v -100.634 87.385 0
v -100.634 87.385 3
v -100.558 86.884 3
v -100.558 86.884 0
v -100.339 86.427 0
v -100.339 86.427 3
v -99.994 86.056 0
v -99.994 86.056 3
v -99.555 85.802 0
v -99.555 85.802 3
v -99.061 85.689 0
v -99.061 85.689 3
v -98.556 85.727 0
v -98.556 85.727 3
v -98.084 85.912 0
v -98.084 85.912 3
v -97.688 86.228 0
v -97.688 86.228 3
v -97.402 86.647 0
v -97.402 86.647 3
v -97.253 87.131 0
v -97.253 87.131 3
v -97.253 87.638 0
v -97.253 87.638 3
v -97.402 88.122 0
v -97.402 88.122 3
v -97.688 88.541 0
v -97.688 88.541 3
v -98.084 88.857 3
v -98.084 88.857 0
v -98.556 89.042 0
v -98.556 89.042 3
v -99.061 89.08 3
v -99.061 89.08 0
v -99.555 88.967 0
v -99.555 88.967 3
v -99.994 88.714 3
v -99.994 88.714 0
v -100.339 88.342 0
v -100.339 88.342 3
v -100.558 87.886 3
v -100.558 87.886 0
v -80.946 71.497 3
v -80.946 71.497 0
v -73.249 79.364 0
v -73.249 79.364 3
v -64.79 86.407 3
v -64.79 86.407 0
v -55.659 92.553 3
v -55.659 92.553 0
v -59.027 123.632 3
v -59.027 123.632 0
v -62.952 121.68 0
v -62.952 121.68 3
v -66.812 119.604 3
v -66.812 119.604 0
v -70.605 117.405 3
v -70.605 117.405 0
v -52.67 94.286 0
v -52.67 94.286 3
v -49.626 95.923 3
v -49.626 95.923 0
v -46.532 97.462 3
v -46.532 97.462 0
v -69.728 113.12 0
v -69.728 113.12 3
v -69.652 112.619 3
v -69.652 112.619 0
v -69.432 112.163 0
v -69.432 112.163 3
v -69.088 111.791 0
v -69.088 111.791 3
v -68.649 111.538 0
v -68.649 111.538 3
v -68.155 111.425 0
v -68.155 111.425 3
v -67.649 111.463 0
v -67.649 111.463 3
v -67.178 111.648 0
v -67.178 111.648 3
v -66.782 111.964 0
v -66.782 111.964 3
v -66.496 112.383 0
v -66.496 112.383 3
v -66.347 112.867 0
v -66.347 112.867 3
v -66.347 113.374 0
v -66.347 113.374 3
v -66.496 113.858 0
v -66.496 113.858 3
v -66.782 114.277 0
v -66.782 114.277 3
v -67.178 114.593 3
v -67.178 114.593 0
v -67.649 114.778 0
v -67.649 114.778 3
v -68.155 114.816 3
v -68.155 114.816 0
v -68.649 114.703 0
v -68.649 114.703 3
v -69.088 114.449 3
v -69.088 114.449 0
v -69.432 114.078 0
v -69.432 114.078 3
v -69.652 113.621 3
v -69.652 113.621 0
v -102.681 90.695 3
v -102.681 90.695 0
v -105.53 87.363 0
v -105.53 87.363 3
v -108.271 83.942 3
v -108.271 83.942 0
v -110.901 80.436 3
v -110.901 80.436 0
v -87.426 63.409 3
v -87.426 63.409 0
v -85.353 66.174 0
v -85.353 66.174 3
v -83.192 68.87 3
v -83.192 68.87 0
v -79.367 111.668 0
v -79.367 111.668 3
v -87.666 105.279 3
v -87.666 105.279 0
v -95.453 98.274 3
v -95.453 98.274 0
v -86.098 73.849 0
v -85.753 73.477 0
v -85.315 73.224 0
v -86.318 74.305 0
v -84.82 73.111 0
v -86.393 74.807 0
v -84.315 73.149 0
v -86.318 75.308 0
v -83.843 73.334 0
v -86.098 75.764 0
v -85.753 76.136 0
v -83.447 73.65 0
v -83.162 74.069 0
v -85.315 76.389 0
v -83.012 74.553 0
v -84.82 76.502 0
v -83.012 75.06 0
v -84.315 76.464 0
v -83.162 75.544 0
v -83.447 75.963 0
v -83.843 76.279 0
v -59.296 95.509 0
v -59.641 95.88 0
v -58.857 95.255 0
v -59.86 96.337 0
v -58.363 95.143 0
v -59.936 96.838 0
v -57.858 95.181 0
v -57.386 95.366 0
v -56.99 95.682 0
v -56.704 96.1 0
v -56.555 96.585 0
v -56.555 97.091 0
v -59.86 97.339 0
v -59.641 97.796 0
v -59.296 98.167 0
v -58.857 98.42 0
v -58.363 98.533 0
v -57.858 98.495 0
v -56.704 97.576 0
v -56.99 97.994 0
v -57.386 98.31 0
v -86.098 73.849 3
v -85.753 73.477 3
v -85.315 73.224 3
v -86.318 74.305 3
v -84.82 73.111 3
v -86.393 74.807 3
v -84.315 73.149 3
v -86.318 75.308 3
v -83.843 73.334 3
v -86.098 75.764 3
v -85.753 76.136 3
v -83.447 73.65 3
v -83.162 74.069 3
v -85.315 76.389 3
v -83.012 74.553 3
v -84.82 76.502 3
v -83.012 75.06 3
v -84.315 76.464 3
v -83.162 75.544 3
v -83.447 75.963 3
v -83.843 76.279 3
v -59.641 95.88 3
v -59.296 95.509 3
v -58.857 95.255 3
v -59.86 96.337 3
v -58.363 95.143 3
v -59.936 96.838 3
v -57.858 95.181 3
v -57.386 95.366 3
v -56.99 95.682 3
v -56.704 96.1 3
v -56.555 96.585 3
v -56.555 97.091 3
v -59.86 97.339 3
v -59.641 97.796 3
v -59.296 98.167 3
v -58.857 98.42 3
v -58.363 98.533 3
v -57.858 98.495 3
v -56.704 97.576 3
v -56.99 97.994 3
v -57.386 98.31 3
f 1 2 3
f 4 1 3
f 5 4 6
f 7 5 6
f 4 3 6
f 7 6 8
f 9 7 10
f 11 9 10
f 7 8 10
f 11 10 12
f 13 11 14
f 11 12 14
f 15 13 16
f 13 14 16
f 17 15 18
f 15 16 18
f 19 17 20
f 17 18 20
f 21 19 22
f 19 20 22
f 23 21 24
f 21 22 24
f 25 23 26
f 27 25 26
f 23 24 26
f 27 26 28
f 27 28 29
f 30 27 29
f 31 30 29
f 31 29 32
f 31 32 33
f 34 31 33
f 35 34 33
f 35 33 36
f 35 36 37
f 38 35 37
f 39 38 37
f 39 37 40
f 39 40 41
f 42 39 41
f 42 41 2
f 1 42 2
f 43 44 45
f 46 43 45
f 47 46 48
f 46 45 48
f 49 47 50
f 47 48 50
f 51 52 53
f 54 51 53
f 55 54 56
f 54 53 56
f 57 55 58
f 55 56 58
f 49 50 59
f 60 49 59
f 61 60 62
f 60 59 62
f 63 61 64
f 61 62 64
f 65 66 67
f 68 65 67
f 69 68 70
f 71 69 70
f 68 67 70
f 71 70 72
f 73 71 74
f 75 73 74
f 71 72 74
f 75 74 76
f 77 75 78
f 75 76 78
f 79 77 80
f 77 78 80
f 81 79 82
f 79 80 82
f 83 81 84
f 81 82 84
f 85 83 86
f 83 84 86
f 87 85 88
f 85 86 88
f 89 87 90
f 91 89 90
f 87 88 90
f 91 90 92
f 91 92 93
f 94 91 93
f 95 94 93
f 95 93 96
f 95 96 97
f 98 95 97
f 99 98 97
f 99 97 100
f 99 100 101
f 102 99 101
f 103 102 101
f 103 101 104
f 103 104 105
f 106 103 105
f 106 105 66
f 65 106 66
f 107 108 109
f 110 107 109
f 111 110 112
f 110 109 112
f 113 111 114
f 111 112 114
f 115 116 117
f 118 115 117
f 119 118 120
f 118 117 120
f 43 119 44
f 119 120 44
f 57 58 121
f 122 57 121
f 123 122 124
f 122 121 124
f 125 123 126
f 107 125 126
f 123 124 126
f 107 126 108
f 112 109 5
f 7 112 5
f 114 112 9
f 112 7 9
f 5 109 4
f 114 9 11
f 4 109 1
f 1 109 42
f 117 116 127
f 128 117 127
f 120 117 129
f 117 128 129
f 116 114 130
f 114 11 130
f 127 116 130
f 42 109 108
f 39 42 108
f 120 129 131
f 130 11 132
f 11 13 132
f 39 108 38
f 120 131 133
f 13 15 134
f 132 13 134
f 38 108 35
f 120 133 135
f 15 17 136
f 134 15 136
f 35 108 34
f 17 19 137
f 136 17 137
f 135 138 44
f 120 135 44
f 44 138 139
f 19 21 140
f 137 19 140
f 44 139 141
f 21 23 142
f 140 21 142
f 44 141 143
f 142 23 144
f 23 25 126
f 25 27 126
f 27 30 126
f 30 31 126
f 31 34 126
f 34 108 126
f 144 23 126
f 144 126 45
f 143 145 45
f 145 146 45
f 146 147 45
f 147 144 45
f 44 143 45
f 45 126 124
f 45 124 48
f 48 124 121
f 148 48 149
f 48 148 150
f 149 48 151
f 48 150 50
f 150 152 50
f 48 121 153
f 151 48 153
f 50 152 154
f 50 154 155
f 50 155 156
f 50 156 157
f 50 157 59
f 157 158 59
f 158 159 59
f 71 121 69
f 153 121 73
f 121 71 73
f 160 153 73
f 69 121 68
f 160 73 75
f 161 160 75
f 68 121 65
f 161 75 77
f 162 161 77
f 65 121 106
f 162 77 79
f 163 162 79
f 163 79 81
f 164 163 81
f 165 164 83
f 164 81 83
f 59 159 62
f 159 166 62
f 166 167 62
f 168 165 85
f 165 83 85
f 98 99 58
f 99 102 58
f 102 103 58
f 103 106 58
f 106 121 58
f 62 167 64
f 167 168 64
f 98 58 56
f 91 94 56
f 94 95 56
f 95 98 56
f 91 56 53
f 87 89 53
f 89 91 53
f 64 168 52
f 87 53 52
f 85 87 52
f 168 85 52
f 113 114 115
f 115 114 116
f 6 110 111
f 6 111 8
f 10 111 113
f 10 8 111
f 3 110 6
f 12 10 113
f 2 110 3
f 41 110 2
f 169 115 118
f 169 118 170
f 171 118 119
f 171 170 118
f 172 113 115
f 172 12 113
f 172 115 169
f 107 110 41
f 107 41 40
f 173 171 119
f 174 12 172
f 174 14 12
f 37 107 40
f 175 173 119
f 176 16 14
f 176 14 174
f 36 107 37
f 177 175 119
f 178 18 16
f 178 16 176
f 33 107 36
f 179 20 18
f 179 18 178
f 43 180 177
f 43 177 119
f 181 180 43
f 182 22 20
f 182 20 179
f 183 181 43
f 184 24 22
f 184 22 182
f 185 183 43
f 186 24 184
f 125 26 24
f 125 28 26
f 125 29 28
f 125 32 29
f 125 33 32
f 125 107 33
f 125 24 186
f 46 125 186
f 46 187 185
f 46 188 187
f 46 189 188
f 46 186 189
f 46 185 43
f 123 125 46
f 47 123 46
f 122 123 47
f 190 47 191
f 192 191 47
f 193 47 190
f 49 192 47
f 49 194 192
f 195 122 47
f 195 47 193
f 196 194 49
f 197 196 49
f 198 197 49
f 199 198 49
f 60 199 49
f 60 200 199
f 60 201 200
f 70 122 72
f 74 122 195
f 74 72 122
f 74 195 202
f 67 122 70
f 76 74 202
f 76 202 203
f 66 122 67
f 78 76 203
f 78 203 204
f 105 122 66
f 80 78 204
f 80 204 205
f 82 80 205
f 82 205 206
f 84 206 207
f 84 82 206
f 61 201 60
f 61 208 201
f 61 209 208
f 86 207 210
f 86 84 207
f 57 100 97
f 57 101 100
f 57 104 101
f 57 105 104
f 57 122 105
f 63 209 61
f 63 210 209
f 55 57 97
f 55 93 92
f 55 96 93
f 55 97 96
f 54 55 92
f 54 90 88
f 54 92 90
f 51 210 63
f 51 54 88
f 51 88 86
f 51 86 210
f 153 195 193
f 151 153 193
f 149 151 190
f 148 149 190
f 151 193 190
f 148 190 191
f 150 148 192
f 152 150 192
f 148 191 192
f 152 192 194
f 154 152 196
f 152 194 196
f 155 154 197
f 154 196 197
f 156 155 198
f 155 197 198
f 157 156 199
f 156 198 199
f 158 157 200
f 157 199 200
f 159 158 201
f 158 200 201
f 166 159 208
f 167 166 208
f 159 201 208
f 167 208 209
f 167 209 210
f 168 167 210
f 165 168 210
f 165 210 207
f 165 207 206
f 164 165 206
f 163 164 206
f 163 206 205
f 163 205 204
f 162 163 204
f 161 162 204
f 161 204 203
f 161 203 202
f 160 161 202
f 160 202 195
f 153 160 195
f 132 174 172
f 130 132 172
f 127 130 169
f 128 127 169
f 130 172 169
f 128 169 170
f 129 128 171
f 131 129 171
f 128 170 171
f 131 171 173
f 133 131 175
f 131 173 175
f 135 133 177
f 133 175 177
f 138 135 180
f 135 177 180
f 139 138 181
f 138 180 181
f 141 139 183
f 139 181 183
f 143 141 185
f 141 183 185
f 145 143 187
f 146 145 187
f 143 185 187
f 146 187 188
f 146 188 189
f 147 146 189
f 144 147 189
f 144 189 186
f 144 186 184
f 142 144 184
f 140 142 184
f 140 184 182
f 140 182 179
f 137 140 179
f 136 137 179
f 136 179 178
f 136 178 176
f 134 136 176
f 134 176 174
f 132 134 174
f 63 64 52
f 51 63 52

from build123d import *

# Parameters (mm, degrees)
F1_DEPTH = 3
F2_D     = 3.4


with BuildPart() as f1:
    # F0 (on Top) → F1 (new body)
    with BuildSketch(Plane.XY):
        with BuildLine():
            ThreePointArc((-55.6590960491, 92.5530389939), (-51.154476682, 95.1168729269), (-46.5320369414, 97.4616311072))
            Line((-46.5320369414, 97.4616311072), (-59.0267505646, 123.6318839045))
            ThreePointArc((-59.0267505646, 123.6318839045), (-64.8904009762, 120.6575147314), (-70.6045940623, 117.4052439089))
            ThreePointArc((-70.6045940623, 117.4052439089), (-87.6662762423, 105.278791833), (-102.6814380892, 90.6946650688))
            ThreePointArc((-102.6814380892, 90.6946650688), (-106.9145490542, 85.6637566334), (-110.9014115399, 80.4355451181))
            Line((-110.9014115399, 80.4355451181), (-87.4259302651, 63.4090428669))
            ThreePointArc((-87.4259302651, 63.4090428669), (-84.2830021741, 67.5305526745), (-80.9459511944, 71.4965242878))
            ThreePointArc((-80.9459511944, 71.4965242878), (-69.1091812713, 82.9935001311), (-55.6590960491, 92.5530389939))
        make_face()
    extrude(amount=F1_DEPTH)

    # F2 (through all)
    with Locations(Plane(origin=(0, 0, 0), x_dir=(1, 0, 0), z_dir=(0, 0, -1))):
        with Locations((-98.9339403487, -87.3846407962), (-84.6934489349, -74.8065485604), (-58.2359060514, -96.8379019102), (-68.02778406, -113.1203809925)):
            Hole(F2_D / 2)


solid = f1.part
